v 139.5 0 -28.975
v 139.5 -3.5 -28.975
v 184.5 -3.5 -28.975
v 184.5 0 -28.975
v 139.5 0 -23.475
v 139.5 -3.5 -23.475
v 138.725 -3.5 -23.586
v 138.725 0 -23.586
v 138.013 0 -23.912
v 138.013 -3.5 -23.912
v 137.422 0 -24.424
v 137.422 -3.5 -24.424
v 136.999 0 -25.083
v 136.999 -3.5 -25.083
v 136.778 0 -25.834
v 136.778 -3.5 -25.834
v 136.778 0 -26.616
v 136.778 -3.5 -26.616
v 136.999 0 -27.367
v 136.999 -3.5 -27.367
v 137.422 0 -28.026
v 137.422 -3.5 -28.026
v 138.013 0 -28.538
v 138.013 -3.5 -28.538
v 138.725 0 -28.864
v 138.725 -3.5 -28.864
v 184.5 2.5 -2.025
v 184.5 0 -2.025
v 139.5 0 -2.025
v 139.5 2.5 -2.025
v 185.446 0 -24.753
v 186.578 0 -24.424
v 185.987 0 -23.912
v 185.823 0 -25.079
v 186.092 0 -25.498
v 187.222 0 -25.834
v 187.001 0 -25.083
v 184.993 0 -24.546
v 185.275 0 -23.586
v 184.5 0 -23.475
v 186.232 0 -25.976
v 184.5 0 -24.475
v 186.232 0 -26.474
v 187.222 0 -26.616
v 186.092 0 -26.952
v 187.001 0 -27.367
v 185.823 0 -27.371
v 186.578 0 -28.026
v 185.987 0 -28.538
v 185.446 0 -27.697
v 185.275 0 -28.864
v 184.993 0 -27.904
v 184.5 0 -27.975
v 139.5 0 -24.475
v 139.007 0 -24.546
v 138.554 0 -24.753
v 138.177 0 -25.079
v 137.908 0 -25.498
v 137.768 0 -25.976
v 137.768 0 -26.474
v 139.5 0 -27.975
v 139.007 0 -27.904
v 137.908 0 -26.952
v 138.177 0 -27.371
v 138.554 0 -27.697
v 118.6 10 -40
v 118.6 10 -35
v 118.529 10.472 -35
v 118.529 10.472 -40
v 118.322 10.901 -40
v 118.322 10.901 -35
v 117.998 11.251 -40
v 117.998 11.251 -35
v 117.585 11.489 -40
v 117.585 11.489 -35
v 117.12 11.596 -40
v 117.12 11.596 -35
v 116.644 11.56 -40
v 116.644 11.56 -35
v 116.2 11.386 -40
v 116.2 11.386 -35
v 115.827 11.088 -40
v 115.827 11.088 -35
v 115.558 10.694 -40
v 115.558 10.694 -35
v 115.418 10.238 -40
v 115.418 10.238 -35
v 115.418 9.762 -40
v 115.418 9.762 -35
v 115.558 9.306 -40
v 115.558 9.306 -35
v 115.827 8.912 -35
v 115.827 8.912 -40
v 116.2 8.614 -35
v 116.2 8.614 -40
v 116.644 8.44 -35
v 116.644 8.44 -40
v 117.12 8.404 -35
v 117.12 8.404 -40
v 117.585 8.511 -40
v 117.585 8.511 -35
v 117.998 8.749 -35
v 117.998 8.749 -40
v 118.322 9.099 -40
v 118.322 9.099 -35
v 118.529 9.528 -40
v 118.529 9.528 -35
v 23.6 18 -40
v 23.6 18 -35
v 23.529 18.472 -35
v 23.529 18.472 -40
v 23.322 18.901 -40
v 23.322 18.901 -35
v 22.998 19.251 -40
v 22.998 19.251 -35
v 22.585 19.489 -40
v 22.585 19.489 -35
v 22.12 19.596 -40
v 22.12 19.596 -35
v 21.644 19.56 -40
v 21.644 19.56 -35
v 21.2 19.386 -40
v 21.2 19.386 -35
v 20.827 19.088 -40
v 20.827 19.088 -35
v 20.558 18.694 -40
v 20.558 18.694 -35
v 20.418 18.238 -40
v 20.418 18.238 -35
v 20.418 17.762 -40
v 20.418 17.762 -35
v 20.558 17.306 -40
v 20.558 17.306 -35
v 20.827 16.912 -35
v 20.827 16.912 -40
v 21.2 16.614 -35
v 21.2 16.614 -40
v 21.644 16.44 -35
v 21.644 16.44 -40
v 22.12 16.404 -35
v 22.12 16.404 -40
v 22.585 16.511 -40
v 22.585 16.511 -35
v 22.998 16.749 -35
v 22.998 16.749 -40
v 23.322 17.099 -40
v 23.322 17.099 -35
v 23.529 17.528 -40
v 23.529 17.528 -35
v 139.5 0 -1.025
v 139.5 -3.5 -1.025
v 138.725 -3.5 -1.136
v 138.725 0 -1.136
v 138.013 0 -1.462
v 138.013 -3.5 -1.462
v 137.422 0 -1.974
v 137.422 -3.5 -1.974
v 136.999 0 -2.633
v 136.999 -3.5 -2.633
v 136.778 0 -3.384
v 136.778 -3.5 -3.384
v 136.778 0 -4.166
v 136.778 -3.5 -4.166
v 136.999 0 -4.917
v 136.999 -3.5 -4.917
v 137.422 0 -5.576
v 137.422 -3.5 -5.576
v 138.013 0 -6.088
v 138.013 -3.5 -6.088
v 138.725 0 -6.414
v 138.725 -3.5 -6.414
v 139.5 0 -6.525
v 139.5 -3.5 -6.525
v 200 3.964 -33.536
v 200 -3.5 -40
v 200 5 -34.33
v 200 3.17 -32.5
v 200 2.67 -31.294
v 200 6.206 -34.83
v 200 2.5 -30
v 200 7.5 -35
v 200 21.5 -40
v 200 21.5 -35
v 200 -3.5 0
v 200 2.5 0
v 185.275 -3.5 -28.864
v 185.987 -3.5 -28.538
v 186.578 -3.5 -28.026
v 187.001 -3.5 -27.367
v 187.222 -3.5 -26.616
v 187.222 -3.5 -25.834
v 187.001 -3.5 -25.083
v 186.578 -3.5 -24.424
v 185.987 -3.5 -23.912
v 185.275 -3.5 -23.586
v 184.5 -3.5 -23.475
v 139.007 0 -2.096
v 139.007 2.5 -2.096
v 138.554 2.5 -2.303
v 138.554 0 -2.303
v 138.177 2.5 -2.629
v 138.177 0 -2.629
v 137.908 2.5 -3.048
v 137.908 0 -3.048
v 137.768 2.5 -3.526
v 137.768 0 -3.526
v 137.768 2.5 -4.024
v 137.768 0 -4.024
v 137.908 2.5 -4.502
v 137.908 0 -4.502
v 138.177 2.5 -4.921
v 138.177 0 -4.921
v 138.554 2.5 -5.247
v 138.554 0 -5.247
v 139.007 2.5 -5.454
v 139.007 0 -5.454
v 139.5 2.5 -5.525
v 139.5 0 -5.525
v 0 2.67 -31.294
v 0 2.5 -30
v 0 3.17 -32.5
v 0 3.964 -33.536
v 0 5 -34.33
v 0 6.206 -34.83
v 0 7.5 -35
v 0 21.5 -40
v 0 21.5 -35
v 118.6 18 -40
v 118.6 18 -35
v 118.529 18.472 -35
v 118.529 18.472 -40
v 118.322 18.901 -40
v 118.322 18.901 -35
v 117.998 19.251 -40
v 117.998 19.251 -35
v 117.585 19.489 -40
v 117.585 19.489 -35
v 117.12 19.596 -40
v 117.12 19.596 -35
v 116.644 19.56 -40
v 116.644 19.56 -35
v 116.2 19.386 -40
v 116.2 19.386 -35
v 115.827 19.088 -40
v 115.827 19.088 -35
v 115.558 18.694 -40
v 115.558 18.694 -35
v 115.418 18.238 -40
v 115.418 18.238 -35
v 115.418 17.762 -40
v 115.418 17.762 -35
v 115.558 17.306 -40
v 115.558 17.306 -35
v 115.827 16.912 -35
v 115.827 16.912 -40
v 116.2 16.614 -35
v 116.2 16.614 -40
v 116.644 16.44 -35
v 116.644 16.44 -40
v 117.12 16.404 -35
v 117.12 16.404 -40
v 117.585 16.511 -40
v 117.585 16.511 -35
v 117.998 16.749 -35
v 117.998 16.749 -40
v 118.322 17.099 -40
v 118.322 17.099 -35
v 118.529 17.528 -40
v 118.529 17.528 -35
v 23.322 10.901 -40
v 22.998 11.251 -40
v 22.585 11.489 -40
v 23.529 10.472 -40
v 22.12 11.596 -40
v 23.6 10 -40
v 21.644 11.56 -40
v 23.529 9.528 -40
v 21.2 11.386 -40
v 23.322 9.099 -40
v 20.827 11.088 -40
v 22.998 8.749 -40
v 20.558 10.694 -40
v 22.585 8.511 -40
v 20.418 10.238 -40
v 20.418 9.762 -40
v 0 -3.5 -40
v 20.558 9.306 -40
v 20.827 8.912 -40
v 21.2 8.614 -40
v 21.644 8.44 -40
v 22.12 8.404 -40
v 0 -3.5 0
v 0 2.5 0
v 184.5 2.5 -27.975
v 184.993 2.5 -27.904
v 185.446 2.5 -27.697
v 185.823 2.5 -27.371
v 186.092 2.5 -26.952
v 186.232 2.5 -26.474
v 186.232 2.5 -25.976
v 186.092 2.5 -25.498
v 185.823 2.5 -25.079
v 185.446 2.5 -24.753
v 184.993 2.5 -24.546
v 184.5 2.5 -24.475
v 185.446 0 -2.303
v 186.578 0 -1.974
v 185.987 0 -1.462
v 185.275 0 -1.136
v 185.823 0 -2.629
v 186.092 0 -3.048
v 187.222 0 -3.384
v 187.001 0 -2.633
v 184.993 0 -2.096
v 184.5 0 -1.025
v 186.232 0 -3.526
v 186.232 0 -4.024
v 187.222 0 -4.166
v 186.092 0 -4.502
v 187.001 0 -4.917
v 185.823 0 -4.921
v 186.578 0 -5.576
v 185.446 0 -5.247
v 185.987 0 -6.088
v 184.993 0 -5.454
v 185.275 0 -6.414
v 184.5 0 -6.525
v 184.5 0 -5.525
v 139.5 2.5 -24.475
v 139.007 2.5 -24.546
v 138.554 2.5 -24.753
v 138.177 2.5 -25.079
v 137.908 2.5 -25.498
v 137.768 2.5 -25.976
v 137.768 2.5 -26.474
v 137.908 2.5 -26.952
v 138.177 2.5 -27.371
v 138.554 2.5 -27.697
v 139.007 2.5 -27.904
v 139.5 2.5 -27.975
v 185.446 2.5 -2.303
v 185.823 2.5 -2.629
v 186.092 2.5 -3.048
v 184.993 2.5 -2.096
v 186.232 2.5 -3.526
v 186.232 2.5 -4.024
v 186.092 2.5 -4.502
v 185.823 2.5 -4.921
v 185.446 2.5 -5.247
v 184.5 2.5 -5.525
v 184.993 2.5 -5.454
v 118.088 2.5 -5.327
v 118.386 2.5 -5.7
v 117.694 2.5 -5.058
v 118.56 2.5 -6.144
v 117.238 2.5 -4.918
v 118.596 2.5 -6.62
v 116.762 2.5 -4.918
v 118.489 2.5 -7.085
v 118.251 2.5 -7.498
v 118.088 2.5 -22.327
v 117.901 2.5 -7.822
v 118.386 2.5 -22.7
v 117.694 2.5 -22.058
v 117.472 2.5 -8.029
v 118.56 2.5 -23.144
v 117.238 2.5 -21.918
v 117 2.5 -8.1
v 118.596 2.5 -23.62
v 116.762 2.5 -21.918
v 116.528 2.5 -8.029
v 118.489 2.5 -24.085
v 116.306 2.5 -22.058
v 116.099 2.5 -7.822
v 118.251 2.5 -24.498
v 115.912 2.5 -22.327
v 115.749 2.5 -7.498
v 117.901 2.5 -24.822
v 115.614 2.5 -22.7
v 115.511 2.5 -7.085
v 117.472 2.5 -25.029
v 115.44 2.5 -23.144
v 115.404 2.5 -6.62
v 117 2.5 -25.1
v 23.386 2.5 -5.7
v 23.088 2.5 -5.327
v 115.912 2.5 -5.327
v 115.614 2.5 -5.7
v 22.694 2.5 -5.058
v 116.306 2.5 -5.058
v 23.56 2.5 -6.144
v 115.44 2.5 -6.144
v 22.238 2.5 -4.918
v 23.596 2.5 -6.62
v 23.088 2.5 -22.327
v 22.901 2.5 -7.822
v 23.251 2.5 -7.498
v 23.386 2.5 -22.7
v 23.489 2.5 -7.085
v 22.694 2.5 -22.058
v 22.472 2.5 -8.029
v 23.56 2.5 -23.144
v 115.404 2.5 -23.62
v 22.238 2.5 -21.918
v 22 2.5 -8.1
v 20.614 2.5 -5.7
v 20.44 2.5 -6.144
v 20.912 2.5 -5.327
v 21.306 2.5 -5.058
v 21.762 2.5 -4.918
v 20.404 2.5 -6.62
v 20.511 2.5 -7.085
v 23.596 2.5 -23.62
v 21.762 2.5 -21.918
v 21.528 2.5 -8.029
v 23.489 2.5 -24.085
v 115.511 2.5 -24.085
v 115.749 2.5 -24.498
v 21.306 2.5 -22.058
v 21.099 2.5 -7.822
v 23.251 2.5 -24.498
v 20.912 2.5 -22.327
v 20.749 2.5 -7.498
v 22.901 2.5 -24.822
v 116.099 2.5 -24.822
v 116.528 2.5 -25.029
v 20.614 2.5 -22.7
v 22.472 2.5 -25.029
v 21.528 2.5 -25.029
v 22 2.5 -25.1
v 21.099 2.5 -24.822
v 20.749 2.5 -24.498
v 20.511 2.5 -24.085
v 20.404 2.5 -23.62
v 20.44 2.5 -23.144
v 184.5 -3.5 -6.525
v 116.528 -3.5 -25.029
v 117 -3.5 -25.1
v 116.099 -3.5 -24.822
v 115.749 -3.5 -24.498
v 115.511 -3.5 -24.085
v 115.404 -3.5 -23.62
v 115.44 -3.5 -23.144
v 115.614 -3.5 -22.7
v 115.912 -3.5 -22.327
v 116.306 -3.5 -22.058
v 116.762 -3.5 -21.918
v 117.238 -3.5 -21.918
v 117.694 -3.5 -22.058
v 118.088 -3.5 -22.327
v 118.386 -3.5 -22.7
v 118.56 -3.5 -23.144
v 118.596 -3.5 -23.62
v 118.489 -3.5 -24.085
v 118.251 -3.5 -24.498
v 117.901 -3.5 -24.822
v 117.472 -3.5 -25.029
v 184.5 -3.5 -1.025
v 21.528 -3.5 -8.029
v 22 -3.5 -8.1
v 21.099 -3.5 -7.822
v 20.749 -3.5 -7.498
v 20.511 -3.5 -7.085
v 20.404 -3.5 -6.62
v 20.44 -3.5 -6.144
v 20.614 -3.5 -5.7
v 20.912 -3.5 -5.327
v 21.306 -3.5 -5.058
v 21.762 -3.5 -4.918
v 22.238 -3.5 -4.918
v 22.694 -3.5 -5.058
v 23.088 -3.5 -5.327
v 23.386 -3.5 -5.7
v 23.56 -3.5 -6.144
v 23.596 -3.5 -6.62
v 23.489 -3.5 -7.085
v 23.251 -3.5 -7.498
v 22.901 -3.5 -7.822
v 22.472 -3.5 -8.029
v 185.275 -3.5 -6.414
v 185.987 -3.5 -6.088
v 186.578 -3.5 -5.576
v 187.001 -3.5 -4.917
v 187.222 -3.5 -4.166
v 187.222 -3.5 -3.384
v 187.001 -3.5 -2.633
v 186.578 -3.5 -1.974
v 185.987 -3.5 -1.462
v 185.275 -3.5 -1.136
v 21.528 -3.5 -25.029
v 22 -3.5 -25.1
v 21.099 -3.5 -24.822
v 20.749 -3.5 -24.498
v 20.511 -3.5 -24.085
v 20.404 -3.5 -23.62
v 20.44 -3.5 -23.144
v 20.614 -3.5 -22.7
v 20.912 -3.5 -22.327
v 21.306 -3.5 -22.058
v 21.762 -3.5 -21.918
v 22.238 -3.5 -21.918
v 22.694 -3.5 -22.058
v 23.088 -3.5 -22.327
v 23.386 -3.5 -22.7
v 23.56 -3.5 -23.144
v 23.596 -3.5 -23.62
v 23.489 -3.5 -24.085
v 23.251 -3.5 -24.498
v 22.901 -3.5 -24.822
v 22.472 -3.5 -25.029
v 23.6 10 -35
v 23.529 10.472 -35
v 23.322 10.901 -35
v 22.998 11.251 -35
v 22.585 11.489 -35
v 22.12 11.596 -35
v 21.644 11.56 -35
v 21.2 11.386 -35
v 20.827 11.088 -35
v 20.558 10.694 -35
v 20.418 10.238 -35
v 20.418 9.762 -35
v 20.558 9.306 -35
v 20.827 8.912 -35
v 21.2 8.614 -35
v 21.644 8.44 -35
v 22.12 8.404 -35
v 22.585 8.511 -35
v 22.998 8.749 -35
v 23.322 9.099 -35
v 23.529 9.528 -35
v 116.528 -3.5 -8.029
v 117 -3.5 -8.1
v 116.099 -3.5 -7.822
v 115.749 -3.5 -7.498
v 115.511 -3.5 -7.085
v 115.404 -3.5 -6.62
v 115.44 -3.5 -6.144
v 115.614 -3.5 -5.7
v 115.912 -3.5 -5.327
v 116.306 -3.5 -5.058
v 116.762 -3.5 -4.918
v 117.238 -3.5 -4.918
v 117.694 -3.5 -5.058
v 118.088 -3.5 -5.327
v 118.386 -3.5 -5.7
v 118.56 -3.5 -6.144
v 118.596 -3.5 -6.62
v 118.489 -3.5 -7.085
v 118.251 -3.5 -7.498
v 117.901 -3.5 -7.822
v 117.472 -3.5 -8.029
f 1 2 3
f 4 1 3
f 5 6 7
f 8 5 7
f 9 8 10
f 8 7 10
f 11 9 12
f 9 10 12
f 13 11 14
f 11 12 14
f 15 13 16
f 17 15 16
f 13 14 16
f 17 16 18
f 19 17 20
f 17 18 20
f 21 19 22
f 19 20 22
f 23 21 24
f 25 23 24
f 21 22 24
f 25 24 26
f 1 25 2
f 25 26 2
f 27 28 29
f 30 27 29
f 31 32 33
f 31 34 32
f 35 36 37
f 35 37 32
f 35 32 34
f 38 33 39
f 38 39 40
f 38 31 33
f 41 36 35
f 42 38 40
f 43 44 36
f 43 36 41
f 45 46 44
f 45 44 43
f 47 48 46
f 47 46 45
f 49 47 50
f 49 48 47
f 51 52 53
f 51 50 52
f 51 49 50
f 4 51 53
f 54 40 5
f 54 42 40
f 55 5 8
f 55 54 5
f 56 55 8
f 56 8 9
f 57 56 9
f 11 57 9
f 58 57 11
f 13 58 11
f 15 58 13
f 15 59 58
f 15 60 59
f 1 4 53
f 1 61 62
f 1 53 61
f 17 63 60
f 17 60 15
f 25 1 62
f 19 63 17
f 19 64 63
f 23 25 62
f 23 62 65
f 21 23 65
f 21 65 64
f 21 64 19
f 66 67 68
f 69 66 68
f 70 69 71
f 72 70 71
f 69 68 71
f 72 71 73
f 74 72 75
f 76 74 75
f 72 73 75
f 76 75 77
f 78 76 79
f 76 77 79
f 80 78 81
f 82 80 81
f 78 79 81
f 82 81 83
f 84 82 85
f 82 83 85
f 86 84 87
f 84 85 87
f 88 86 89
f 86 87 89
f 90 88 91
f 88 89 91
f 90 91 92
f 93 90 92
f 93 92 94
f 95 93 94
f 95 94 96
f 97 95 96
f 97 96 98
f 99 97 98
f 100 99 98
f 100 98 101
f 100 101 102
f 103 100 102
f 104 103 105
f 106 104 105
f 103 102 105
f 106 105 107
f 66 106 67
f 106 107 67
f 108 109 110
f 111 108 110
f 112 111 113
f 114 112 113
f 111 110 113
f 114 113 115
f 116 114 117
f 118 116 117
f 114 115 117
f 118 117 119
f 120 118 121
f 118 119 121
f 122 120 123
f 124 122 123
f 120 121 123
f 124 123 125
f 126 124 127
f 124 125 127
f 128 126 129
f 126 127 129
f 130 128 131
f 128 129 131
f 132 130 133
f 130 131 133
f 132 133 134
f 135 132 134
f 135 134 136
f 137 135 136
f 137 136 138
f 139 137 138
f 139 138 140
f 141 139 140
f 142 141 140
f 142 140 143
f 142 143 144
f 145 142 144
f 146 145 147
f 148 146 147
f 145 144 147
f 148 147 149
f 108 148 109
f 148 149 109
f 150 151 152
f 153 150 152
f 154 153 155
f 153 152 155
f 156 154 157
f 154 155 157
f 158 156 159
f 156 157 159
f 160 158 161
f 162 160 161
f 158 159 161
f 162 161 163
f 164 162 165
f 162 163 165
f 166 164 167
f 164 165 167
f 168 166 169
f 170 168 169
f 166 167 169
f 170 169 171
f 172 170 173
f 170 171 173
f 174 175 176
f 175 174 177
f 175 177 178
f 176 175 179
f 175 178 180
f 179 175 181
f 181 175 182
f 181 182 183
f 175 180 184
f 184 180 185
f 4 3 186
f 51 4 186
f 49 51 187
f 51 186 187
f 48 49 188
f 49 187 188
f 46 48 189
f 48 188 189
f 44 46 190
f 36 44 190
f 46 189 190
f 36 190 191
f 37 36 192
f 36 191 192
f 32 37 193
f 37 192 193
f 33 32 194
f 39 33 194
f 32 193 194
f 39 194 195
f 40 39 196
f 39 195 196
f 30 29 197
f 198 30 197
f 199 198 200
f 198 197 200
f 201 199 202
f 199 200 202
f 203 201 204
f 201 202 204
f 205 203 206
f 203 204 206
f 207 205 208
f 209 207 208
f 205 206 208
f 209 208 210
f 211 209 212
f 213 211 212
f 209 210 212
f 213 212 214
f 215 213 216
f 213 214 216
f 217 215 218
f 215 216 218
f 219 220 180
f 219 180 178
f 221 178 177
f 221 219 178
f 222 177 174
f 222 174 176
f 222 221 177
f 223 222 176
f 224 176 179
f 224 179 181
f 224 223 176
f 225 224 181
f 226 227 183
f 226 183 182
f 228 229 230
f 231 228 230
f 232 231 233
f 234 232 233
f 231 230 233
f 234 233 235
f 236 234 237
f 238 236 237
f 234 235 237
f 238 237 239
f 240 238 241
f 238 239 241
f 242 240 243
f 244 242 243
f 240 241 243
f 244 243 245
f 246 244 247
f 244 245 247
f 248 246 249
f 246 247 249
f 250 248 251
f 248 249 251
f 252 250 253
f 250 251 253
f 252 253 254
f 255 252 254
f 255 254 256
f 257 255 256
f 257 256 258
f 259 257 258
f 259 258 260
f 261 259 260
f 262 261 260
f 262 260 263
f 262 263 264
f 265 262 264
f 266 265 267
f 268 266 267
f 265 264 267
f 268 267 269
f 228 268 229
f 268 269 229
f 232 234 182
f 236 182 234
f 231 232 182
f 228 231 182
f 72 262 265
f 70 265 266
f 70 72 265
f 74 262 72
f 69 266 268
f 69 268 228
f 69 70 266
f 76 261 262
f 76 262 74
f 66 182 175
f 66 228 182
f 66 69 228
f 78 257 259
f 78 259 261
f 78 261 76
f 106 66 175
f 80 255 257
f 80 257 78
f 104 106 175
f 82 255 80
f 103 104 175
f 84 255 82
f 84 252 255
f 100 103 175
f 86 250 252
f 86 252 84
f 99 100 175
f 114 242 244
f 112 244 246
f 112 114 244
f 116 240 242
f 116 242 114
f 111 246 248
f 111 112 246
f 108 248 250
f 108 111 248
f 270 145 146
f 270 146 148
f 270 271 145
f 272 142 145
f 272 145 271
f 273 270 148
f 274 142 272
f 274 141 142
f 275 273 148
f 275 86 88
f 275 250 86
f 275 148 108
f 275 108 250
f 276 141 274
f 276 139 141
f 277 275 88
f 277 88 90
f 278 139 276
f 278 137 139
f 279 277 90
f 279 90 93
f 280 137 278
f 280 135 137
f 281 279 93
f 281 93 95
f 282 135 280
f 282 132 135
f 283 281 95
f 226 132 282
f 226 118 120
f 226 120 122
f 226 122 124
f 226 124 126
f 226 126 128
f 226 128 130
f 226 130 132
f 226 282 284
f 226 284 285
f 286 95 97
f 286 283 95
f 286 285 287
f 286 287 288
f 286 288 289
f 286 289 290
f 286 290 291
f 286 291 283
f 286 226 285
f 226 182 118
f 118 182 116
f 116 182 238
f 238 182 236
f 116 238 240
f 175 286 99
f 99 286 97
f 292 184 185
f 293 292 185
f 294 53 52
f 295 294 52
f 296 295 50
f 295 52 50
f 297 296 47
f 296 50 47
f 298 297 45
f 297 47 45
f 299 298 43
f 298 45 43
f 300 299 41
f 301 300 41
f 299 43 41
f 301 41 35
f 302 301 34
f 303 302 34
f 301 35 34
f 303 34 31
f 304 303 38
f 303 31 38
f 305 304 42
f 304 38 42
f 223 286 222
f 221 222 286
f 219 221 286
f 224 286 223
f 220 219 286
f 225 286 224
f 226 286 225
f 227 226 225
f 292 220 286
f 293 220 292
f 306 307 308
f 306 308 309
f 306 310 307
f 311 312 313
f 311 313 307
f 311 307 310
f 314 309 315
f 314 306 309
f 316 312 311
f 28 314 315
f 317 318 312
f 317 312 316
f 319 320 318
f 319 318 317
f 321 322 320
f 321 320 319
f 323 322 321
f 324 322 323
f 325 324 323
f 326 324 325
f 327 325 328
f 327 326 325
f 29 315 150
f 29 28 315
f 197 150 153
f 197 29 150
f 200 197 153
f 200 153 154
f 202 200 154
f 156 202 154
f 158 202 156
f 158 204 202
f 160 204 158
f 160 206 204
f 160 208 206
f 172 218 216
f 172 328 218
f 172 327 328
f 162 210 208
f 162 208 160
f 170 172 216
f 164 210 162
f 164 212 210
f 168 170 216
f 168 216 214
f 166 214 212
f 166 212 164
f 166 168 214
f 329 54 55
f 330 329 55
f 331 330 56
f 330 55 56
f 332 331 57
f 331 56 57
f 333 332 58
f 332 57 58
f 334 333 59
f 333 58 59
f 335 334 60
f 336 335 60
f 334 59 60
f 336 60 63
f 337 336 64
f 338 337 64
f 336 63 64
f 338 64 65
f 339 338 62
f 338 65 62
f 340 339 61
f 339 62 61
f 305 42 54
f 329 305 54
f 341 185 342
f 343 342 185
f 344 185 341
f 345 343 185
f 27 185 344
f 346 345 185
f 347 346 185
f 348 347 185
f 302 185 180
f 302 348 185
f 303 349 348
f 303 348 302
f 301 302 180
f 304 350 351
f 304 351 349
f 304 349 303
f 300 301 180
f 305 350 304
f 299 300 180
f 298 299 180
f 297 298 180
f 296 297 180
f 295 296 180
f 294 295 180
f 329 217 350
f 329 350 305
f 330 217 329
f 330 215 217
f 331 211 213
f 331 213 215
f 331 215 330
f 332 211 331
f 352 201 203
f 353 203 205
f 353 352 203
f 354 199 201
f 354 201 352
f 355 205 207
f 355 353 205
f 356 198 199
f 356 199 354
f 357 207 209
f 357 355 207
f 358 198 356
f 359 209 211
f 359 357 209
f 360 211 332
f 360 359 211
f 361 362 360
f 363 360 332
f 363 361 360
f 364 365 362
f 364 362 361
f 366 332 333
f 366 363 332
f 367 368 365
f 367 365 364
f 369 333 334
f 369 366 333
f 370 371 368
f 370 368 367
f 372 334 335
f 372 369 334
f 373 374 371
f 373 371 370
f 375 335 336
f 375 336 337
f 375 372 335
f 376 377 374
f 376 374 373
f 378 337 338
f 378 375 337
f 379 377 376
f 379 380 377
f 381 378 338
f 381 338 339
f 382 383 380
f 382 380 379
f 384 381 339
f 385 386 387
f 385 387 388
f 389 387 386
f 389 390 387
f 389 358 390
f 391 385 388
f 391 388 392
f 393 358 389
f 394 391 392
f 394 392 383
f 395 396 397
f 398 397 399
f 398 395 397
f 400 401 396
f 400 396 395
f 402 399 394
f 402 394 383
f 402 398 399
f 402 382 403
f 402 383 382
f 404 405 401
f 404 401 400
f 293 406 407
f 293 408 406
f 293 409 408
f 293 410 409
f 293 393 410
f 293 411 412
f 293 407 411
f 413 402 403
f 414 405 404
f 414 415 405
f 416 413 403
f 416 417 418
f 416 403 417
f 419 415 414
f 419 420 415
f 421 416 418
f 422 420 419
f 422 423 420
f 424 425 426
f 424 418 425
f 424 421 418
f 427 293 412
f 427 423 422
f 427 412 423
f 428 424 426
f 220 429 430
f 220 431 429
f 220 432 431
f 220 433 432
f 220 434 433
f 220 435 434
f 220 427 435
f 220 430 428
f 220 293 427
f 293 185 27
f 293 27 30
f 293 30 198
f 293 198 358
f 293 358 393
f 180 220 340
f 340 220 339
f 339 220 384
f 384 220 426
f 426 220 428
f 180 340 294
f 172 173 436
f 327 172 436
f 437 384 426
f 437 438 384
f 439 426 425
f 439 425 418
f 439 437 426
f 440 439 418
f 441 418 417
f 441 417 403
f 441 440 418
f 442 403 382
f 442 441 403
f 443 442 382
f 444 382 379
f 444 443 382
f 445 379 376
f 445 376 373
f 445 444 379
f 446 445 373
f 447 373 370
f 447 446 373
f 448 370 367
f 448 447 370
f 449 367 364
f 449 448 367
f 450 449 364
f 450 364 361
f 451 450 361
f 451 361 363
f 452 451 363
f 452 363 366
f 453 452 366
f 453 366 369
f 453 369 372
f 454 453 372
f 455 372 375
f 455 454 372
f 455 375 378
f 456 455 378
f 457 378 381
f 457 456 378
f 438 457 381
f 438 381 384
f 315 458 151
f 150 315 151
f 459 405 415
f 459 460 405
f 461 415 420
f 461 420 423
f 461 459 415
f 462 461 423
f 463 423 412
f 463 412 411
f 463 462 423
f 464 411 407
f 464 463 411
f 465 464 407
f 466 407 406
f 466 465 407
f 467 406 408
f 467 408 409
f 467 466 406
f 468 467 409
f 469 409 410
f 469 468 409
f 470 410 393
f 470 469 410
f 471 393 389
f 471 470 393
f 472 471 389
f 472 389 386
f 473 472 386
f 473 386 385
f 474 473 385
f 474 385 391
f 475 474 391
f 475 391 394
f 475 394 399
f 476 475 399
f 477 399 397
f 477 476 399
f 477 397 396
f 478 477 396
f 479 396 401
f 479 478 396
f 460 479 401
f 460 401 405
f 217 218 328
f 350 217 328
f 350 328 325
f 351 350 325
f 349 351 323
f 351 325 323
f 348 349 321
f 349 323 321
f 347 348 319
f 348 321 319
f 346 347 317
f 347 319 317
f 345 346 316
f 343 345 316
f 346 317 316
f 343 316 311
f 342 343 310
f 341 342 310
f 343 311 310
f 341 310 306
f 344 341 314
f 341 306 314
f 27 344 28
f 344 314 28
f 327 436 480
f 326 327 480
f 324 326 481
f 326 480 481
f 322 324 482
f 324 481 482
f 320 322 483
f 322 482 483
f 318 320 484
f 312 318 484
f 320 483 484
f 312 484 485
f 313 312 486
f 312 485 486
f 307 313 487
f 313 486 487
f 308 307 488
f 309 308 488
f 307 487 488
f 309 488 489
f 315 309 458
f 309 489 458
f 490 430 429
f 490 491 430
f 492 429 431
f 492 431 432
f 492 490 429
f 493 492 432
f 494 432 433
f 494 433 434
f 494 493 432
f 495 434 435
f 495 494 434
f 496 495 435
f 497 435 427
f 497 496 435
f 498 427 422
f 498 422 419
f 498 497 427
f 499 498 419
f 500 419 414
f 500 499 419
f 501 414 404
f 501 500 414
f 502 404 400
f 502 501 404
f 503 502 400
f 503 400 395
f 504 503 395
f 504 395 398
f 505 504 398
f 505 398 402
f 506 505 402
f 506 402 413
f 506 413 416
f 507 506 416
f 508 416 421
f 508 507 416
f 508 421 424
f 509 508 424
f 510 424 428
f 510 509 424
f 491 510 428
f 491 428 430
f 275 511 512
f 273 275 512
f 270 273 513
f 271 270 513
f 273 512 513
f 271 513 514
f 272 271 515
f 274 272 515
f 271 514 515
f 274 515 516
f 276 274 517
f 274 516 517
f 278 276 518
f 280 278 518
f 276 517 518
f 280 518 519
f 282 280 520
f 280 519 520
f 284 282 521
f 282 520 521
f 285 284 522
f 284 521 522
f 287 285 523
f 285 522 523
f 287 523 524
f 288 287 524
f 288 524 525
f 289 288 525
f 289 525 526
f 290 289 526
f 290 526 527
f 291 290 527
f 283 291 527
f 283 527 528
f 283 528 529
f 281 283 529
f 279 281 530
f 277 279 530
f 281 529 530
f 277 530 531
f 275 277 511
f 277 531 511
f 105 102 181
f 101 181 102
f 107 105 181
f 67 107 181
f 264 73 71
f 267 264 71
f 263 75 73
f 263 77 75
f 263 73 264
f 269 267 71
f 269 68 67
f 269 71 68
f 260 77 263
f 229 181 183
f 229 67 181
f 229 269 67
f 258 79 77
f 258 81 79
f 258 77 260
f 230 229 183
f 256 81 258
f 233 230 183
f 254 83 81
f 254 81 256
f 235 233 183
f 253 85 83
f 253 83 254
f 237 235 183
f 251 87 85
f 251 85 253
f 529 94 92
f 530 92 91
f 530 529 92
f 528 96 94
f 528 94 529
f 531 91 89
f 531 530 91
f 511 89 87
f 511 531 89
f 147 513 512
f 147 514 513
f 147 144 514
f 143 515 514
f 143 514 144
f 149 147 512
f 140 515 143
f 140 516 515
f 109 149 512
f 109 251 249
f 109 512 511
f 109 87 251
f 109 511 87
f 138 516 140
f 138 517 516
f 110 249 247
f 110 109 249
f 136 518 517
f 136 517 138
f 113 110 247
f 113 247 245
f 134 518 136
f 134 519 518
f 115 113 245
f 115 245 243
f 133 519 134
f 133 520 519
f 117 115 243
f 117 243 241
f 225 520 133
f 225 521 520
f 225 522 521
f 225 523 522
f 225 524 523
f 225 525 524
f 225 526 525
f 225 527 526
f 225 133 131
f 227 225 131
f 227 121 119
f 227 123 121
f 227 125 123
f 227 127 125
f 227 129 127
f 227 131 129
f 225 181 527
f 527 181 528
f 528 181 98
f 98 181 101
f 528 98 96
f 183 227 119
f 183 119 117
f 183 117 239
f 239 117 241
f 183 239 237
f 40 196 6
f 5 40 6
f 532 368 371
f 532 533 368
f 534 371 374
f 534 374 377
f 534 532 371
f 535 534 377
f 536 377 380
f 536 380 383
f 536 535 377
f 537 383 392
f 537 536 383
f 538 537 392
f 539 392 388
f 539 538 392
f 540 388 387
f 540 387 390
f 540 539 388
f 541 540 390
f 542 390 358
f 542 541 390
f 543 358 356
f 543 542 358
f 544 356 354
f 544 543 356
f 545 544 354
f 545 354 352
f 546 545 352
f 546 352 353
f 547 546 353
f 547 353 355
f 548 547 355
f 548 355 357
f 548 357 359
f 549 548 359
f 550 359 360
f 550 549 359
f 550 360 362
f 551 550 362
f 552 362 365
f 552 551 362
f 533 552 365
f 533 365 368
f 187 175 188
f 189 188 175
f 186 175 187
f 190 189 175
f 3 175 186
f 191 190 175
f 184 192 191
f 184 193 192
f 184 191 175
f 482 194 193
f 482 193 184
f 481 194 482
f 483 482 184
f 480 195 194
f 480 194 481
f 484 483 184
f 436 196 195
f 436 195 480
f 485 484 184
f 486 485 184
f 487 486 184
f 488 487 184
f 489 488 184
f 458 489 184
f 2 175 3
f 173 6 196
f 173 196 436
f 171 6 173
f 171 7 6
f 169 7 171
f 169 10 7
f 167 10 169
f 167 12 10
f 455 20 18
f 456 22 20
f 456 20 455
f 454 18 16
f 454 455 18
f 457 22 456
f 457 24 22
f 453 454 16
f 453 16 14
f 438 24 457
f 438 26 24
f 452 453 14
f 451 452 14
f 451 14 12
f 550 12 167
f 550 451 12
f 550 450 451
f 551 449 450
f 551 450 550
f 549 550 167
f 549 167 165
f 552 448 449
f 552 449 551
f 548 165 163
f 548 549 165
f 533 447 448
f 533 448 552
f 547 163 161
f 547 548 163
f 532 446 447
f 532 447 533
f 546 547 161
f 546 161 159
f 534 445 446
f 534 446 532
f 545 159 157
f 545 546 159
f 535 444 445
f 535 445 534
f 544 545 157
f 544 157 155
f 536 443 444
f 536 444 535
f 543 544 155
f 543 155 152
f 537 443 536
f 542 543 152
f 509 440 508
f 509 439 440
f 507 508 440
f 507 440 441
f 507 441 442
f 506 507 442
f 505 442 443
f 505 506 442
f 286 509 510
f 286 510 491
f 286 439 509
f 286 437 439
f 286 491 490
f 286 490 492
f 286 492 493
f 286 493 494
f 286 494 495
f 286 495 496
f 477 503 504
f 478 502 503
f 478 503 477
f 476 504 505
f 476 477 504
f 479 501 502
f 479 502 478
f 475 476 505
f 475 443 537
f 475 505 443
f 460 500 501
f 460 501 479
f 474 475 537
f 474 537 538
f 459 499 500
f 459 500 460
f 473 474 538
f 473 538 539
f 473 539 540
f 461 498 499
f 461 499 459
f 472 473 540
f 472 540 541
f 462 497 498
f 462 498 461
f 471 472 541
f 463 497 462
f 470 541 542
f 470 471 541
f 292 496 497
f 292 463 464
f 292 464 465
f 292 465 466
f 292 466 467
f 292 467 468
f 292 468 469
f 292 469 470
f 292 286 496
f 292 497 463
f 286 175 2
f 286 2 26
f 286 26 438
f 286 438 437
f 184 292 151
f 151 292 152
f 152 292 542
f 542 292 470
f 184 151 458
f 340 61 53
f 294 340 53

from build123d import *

# Parameters (mm, degrees)
BOSS_EXTRUDE8_DEPTH = 200
SKETCH4_R           = 1.6
CUT_EXTRUDE1_DEPTH  = 2.5
CUT_EXTRUDE2_START  = -3.5
SKETCH5_R           = 1.6
CUT_EXTRUDE2_DEPTH  = 3.5
SKETCH7_R           = 1.6
CUT_EXTRUDE3_DEPTH  = 5


with BuildPart() as part:
    # Sketch6 → Boss-Extrude8 (new body)
    with BuildSketch(Plane(origin=(0, 0, 0), x_dir=(0, 0, -1), z_dir=(1, 0, 0))):
        with BuildLine():
            Line((0, 2.5), (30, 2.5))
            ThreePointArc((30, 2.5), (33.535533906, 3.964466094), (35, 7.5))
            Line((35, 7.5), (35, 21.5))
            Line((35, 21.5), (40, 21.5))
            Line((40, 21.5), (40, -3.5))
            Line((40, -3.5), (0, -3.5))
            Line((0, -3.5), (0, 2.5))
        make_face()
    extrude(amount=BOSS_EXTRUDE8_DEPTH)

    # Sketch4 → Cut-Extrude1 (cut)
    with BuildSketch(Plane(origin=(0, 0, 0), x_dir=(1, 0, 0), z_dir=(0, 1, 0))):
        with Locations(Location((22, 23.5, 0), (0, 0, 90))):
            Circle(SKETCH4_R)
        with Locations(Location((22, 6.5, 0), (0, 0, 90))):
            Circle(SKETCH4_R)
        with Locations(Location((117, 23.5, 0), (0, 0, 90))):
            Circle(SKETCH4_R)
        with Locations(Location((117, 6.5, 0), (0, 0, 90))):
            Circle(SKETCH4_R)
        with BuildLine():
            Line((139.5, 27.975), (184.5, 27.975))
            ThreePointArc((184.5, 27.975), (186.25, 26.225), (184.5, 24.475))
            Line((184.5, 24.475), (139.5, 24.475))
            ThreePointArc((139.5, 24.475), (137.75, 26.225), (139.5, 27.975))
        make_face()
        with BuildLine():
            Line((139.5, 5.525), (184.5, 5.525))
            ThreePointArc((184.5, 5.525), (186.25, 3.775), (184.5, 2.025))
            Line((184.5, 2.025), (139.5, 2.025))
            ThreePointArc((139.5, 2.025), (137.75, 3.775), (139.5, 5.525))
        make_face()
    extrude(amount=CUT_EXTRUDE1_DEPTH, mode=Mode.SUBTRACT)

    # Sketch5 → Cut-Extrude2 (cut)
    with BuildSketch(Plane(origin=(0, 0, 0), x_dir=(1, 0, 0), z_dir=(0, 1, 0)).offset(CUT_EXTRUDE2_START)):
        with Locations(Location((22, 23.5, 0), (0, 0, 90))):
            Circle(SKETCH5_R)
        with Locations(Location((22, 6.5, 0), (0, 0, 90))):
            Circle(SKETCH5_R)
        with Locations(Location((117, 23.5, 0), (0, 0, 90))):
            Circle(SKETCH5_R)
        with Locations(Location((117, 6.5, 0), (0, 0, 90))):
            Circle(SKETCH5_R)
        with BuildLine():
            Line((184.5, 23.475), (139.5, 23.475))
            ThreePointArc((139.5, 23.475), (136.75, 26.225), (139.5, 28.975))
            Line((139.5, 28.975), (184.5, 28.975))
            ThreePointArc((184.5, 28.975), (187.25, 26.225), (184.5, 23.475))
        make_face()
        with BuildLine():
            Line((184.5, 1.025), (139.5, 1.025))
            ThreePointArc((139.5, 1.025), (136.75, 3.775), (139.5, 6.525))
            Line((139.5, 6.525), (184.5, 6.525))
            ThreePointArc((184.5, 6.525), (187.25, 3.775), (184.5, 1.025))
        make_face()
    extrude(amount=CUT_EXTRUDE2_DEPTH, mode=Mode.SUBTRACT)

    # Sketch7 → Cut-Extrude3 (cut)
    with BuildSketch(Plane.XY.offset(-35)):
        with Locations((22, 10)):
            Circle(SKETCH7_R)
        with Locations((22, 18)):
            Circle(SKETCH7_R)
        with Locations((117, 10)):
            Circle(SKETCH7_R)
        with Locations((117, 18)):
            Circle(SKETCH7_R)
    extrude(amount=-CUT_EXTRUDE3_DEPTH, mode=Mode.SUBTRACT)


solid = part.part
